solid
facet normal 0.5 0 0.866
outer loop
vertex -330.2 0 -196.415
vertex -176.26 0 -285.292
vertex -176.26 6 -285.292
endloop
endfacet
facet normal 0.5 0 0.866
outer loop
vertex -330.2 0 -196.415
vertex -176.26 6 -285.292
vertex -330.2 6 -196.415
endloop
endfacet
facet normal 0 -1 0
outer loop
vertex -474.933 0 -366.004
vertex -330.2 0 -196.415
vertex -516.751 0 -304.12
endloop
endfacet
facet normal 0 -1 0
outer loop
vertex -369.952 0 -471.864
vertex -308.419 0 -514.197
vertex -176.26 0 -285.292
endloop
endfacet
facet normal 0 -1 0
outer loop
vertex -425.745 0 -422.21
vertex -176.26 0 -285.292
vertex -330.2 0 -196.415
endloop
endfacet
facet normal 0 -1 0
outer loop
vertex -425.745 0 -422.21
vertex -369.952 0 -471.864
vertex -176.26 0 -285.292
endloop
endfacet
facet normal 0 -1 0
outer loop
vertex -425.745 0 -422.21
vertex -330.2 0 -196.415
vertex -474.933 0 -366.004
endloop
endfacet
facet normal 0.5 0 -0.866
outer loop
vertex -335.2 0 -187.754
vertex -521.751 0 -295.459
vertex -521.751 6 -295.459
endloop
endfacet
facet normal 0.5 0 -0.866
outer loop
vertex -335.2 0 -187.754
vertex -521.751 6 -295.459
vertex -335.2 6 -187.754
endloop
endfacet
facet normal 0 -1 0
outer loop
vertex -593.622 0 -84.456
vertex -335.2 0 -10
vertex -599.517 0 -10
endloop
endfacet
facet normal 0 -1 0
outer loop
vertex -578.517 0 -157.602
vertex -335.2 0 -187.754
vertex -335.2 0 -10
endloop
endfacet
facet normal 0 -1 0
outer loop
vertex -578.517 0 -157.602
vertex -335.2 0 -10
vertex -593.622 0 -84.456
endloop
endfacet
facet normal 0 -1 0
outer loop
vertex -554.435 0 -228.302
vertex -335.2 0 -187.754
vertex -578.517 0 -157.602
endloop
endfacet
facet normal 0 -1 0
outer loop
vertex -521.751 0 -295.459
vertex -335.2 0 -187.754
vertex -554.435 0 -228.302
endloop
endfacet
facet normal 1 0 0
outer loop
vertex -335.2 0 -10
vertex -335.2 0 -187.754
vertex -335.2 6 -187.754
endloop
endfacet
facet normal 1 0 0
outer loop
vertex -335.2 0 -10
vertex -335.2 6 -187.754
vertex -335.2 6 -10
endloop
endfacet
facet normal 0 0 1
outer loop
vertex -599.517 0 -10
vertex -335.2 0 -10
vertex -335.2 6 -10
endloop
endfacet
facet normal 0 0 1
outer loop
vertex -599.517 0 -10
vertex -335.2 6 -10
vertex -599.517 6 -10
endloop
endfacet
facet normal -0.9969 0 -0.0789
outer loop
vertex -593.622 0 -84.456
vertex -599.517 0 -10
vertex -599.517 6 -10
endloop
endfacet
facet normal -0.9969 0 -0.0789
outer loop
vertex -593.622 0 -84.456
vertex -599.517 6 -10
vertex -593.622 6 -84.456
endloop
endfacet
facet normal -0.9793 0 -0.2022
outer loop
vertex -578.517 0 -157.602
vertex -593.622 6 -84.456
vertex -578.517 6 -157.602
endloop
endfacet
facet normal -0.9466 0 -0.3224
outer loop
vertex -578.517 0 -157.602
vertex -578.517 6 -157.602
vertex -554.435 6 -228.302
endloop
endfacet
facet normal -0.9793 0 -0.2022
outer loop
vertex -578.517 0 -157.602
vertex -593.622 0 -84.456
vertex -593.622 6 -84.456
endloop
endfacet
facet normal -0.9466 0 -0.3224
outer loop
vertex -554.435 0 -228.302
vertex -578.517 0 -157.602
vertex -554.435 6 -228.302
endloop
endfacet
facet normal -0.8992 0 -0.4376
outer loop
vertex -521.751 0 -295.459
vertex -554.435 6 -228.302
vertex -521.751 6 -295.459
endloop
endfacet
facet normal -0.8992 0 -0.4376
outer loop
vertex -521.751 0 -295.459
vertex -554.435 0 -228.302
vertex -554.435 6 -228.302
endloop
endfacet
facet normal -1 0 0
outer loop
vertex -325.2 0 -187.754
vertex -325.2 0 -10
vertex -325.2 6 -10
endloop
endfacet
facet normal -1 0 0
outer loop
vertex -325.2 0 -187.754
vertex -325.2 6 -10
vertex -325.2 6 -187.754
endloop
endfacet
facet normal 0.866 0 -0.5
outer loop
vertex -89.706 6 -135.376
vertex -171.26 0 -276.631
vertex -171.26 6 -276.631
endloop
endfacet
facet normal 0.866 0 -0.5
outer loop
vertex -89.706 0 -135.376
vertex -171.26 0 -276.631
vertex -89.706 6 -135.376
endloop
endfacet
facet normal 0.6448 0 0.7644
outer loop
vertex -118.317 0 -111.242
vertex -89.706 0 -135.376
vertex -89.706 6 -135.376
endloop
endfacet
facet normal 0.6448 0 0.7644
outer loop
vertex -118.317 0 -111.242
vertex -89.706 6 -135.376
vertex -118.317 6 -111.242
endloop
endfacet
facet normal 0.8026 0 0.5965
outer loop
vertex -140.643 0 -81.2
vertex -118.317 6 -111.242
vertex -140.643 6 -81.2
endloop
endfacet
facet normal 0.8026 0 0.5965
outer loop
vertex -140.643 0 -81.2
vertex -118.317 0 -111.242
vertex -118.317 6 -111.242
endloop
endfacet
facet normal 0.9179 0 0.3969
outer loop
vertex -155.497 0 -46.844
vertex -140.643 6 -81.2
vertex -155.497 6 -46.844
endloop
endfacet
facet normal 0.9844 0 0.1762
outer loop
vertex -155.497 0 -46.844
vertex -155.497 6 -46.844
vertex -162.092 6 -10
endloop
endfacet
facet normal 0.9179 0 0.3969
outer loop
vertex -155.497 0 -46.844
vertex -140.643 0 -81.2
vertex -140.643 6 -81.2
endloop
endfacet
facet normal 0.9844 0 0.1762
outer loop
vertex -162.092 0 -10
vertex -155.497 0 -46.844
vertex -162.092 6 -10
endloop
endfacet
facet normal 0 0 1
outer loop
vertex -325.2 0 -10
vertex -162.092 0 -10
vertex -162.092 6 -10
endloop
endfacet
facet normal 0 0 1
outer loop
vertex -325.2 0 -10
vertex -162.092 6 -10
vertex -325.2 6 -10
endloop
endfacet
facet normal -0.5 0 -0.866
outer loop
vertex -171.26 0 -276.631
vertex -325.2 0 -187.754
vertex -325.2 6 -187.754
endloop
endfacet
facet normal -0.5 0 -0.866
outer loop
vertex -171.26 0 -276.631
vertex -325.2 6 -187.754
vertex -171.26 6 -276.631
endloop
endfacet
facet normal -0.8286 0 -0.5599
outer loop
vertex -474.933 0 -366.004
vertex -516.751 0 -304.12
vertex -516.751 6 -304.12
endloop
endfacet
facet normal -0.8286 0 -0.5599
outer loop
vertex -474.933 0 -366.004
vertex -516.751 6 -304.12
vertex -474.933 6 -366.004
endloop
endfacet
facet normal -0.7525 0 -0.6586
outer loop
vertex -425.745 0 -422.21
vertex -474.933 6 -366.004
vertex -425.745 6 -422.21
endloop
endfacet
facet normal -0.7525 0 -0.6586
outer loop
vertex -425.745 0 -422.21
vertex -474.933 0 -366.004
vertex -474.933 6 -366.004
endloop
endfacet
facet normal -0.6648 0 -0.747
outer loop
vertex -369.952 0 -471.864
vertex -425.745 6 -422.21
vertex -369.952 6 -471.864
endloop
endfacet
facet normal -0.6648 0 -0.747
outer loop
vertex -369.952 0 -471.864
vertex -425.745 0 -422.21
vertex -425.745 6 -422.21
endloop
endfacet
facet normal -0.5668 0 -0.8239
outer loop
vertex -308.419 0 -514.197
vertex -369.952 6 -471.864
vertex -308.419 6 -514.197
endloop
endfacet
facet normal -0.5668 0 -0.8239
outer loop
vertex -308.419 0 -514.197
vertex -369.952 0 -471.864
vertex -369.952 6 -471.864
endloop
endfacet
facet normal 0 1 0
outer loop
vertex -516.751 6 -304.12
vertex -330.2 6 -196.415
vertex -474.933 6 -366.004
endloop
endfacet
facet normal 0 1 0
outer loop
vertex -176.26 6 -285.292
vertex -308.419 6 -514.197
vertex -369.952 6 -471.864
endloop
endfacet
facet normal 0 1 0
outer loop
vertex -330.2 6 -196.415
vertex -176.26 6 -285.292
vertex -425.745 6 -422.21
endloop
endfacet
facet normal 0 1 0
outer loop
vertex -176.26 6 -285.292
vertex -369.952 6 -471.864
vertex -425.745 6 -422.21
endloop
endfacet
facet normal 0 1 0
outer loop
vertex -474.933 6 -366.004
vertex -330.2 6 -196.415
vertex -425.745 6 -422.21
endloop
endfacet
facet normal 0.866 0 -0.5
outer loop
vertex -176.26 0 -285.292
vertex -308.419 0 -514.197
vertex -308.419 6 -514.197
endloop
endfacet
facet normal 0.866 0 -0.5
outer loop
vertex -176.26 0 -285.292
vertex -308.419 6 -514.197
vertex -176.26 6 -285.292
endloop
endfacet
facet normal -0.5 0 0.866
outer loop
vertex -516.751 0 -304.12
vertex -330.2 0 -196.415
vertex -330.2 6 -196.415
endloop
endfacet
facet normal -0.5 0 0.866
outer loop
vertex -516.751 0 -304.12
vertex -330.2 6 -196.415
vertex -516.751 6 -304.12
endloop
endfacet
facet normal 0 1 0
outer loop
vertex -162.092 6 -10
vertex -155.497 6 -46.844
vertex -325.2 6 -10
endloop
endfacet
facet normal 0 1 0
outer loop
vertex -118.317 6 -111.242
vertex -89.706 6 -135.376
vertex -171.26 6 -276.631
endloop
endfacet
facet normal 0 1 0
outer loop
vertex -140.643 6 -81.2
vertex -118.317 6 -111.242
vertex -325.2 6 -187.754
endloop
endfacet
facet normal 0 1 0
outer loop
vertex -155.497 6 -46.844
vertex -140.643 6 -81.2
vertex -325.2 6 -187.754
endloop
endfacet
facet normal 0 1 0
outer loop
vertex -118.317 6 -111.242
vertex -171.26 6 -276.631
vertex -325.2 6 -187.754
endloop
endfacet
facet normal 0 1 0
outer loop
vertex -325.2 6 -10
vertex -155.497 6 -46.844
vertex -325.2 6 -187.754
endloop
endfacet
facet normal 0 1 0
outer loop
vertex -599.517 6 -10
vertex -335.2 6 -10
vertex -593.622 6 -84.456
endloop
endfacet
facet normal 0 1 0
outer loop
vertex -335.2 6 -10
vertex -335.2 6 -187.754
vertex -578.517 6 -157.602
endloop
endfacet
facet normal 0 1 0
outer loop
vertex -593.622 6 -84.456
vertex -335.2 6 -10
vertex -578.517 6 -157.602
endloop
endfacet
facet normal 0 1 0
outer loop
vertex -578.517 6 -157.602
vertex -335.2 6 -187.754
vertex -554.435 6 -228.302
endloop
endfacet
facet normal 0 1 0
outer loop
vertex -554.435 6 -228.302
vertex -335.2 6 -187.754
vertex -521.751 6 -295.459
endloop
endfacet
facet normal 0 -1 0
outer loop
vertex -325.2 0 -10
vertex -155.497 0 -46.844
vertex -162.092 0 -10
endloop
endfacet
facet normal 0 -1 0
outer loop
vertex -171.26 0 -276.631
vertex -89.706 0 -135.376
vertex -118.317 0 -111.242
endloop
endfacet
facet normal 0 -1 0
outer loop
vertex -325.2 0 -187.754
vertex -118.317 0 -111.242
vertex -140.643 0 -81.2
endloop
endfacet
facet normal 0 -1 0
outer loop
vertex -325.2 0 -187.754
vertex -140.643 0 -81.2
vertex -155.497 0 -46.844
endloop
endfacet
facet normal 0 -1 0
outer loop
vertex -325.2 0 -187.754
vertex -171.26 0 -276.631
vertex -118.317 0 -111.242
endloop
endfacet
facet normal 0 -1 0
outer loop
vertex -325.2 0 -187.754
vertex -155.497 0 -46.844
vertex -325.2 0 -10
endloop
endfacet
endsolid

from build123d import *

# Parameters (mm, degrees)
BOSS_EXTRUDE1_DEPTH   = 6
BOSS_EXTRUDE1_2_DEPTH = 6
BOSS_EXTRUDE1_3_DEPTH = 6


with BuildPart() as part:
    # Sketch1 → Boss-Extrude1 (new body)
    with BuildSketch(Plane(origin=(0, 0, 0), x_dir=(1, 0, 0), z_dir=(0, 1, 0))):
        with BuildLine():
            ThreePointArc((-599.516605275, 10), (-578.516992176, 157.601553812), (-521.750777563, 295.459449184))
            Line((-521.750777563, 295.459449184), (-335.2, 187.75430754))
            Line((-335.2, 187.75430754), (-335.2, 10))
            Line((-335.2, 10), (-599.516605275, 10))
        make_face()
    extrude(amount=BOSS_EXTRUDE1_DEPTH)


with BuildPart() as body_2:
    # Sketch1 → Boss-Extrude1 2 (new body)
    with BuildSketch(Plane(origin=(0, 0, 0), x_dir=(1, 0, 0), z_dir=(0, 1, 0))):
        with BuildLine():
            ThreePointArc((-516.750777563, 304.119703222), (-425.745445365, 422.209634839), (-308.418556675, 514.196610158))
            Line((-308.418556675, 514.196610158), (-176.260254038, 285.291715349))
            Line((-176.260254038, 285.291715349), (-330.2, 196.414561578))
            Line((-330.2, 196.414561578), (-516.750777563, 304.119703222))
        make_face()
    extrude(amount=BOSS_EXTRUDE1_2_DEPTH)


with BuildPart() as body_3:
    # Sketch1 → Boss-Extrude1 3 (new body)
    with BuildSketch(Plane(origin=(0, 0, 0), x_dir=(1, 0, 0), z_dir=(0, 1, 0))):
        with BuildLine():
            ThreePointArc((-89.706166951, 135.375638912), (-140.642525575, 81.2), (-162.091825827, 10))
            Line((-162.091825827, 10), (-325.2, 10))
            Line((-325.2, 10), (-325.2, 187.75430754))
            Line((-325.2, 187.75430754), (-171.260254038, 276.631461311))
            Line((-171.260254038, 276.631461311), (-89.706166951, 135.375638912))
        make_face()
    extrude(amount=BOSS_EXTRUDE1_3_DEPTH)


solid = Compound([part.part, body_2.part, body_3.part])
